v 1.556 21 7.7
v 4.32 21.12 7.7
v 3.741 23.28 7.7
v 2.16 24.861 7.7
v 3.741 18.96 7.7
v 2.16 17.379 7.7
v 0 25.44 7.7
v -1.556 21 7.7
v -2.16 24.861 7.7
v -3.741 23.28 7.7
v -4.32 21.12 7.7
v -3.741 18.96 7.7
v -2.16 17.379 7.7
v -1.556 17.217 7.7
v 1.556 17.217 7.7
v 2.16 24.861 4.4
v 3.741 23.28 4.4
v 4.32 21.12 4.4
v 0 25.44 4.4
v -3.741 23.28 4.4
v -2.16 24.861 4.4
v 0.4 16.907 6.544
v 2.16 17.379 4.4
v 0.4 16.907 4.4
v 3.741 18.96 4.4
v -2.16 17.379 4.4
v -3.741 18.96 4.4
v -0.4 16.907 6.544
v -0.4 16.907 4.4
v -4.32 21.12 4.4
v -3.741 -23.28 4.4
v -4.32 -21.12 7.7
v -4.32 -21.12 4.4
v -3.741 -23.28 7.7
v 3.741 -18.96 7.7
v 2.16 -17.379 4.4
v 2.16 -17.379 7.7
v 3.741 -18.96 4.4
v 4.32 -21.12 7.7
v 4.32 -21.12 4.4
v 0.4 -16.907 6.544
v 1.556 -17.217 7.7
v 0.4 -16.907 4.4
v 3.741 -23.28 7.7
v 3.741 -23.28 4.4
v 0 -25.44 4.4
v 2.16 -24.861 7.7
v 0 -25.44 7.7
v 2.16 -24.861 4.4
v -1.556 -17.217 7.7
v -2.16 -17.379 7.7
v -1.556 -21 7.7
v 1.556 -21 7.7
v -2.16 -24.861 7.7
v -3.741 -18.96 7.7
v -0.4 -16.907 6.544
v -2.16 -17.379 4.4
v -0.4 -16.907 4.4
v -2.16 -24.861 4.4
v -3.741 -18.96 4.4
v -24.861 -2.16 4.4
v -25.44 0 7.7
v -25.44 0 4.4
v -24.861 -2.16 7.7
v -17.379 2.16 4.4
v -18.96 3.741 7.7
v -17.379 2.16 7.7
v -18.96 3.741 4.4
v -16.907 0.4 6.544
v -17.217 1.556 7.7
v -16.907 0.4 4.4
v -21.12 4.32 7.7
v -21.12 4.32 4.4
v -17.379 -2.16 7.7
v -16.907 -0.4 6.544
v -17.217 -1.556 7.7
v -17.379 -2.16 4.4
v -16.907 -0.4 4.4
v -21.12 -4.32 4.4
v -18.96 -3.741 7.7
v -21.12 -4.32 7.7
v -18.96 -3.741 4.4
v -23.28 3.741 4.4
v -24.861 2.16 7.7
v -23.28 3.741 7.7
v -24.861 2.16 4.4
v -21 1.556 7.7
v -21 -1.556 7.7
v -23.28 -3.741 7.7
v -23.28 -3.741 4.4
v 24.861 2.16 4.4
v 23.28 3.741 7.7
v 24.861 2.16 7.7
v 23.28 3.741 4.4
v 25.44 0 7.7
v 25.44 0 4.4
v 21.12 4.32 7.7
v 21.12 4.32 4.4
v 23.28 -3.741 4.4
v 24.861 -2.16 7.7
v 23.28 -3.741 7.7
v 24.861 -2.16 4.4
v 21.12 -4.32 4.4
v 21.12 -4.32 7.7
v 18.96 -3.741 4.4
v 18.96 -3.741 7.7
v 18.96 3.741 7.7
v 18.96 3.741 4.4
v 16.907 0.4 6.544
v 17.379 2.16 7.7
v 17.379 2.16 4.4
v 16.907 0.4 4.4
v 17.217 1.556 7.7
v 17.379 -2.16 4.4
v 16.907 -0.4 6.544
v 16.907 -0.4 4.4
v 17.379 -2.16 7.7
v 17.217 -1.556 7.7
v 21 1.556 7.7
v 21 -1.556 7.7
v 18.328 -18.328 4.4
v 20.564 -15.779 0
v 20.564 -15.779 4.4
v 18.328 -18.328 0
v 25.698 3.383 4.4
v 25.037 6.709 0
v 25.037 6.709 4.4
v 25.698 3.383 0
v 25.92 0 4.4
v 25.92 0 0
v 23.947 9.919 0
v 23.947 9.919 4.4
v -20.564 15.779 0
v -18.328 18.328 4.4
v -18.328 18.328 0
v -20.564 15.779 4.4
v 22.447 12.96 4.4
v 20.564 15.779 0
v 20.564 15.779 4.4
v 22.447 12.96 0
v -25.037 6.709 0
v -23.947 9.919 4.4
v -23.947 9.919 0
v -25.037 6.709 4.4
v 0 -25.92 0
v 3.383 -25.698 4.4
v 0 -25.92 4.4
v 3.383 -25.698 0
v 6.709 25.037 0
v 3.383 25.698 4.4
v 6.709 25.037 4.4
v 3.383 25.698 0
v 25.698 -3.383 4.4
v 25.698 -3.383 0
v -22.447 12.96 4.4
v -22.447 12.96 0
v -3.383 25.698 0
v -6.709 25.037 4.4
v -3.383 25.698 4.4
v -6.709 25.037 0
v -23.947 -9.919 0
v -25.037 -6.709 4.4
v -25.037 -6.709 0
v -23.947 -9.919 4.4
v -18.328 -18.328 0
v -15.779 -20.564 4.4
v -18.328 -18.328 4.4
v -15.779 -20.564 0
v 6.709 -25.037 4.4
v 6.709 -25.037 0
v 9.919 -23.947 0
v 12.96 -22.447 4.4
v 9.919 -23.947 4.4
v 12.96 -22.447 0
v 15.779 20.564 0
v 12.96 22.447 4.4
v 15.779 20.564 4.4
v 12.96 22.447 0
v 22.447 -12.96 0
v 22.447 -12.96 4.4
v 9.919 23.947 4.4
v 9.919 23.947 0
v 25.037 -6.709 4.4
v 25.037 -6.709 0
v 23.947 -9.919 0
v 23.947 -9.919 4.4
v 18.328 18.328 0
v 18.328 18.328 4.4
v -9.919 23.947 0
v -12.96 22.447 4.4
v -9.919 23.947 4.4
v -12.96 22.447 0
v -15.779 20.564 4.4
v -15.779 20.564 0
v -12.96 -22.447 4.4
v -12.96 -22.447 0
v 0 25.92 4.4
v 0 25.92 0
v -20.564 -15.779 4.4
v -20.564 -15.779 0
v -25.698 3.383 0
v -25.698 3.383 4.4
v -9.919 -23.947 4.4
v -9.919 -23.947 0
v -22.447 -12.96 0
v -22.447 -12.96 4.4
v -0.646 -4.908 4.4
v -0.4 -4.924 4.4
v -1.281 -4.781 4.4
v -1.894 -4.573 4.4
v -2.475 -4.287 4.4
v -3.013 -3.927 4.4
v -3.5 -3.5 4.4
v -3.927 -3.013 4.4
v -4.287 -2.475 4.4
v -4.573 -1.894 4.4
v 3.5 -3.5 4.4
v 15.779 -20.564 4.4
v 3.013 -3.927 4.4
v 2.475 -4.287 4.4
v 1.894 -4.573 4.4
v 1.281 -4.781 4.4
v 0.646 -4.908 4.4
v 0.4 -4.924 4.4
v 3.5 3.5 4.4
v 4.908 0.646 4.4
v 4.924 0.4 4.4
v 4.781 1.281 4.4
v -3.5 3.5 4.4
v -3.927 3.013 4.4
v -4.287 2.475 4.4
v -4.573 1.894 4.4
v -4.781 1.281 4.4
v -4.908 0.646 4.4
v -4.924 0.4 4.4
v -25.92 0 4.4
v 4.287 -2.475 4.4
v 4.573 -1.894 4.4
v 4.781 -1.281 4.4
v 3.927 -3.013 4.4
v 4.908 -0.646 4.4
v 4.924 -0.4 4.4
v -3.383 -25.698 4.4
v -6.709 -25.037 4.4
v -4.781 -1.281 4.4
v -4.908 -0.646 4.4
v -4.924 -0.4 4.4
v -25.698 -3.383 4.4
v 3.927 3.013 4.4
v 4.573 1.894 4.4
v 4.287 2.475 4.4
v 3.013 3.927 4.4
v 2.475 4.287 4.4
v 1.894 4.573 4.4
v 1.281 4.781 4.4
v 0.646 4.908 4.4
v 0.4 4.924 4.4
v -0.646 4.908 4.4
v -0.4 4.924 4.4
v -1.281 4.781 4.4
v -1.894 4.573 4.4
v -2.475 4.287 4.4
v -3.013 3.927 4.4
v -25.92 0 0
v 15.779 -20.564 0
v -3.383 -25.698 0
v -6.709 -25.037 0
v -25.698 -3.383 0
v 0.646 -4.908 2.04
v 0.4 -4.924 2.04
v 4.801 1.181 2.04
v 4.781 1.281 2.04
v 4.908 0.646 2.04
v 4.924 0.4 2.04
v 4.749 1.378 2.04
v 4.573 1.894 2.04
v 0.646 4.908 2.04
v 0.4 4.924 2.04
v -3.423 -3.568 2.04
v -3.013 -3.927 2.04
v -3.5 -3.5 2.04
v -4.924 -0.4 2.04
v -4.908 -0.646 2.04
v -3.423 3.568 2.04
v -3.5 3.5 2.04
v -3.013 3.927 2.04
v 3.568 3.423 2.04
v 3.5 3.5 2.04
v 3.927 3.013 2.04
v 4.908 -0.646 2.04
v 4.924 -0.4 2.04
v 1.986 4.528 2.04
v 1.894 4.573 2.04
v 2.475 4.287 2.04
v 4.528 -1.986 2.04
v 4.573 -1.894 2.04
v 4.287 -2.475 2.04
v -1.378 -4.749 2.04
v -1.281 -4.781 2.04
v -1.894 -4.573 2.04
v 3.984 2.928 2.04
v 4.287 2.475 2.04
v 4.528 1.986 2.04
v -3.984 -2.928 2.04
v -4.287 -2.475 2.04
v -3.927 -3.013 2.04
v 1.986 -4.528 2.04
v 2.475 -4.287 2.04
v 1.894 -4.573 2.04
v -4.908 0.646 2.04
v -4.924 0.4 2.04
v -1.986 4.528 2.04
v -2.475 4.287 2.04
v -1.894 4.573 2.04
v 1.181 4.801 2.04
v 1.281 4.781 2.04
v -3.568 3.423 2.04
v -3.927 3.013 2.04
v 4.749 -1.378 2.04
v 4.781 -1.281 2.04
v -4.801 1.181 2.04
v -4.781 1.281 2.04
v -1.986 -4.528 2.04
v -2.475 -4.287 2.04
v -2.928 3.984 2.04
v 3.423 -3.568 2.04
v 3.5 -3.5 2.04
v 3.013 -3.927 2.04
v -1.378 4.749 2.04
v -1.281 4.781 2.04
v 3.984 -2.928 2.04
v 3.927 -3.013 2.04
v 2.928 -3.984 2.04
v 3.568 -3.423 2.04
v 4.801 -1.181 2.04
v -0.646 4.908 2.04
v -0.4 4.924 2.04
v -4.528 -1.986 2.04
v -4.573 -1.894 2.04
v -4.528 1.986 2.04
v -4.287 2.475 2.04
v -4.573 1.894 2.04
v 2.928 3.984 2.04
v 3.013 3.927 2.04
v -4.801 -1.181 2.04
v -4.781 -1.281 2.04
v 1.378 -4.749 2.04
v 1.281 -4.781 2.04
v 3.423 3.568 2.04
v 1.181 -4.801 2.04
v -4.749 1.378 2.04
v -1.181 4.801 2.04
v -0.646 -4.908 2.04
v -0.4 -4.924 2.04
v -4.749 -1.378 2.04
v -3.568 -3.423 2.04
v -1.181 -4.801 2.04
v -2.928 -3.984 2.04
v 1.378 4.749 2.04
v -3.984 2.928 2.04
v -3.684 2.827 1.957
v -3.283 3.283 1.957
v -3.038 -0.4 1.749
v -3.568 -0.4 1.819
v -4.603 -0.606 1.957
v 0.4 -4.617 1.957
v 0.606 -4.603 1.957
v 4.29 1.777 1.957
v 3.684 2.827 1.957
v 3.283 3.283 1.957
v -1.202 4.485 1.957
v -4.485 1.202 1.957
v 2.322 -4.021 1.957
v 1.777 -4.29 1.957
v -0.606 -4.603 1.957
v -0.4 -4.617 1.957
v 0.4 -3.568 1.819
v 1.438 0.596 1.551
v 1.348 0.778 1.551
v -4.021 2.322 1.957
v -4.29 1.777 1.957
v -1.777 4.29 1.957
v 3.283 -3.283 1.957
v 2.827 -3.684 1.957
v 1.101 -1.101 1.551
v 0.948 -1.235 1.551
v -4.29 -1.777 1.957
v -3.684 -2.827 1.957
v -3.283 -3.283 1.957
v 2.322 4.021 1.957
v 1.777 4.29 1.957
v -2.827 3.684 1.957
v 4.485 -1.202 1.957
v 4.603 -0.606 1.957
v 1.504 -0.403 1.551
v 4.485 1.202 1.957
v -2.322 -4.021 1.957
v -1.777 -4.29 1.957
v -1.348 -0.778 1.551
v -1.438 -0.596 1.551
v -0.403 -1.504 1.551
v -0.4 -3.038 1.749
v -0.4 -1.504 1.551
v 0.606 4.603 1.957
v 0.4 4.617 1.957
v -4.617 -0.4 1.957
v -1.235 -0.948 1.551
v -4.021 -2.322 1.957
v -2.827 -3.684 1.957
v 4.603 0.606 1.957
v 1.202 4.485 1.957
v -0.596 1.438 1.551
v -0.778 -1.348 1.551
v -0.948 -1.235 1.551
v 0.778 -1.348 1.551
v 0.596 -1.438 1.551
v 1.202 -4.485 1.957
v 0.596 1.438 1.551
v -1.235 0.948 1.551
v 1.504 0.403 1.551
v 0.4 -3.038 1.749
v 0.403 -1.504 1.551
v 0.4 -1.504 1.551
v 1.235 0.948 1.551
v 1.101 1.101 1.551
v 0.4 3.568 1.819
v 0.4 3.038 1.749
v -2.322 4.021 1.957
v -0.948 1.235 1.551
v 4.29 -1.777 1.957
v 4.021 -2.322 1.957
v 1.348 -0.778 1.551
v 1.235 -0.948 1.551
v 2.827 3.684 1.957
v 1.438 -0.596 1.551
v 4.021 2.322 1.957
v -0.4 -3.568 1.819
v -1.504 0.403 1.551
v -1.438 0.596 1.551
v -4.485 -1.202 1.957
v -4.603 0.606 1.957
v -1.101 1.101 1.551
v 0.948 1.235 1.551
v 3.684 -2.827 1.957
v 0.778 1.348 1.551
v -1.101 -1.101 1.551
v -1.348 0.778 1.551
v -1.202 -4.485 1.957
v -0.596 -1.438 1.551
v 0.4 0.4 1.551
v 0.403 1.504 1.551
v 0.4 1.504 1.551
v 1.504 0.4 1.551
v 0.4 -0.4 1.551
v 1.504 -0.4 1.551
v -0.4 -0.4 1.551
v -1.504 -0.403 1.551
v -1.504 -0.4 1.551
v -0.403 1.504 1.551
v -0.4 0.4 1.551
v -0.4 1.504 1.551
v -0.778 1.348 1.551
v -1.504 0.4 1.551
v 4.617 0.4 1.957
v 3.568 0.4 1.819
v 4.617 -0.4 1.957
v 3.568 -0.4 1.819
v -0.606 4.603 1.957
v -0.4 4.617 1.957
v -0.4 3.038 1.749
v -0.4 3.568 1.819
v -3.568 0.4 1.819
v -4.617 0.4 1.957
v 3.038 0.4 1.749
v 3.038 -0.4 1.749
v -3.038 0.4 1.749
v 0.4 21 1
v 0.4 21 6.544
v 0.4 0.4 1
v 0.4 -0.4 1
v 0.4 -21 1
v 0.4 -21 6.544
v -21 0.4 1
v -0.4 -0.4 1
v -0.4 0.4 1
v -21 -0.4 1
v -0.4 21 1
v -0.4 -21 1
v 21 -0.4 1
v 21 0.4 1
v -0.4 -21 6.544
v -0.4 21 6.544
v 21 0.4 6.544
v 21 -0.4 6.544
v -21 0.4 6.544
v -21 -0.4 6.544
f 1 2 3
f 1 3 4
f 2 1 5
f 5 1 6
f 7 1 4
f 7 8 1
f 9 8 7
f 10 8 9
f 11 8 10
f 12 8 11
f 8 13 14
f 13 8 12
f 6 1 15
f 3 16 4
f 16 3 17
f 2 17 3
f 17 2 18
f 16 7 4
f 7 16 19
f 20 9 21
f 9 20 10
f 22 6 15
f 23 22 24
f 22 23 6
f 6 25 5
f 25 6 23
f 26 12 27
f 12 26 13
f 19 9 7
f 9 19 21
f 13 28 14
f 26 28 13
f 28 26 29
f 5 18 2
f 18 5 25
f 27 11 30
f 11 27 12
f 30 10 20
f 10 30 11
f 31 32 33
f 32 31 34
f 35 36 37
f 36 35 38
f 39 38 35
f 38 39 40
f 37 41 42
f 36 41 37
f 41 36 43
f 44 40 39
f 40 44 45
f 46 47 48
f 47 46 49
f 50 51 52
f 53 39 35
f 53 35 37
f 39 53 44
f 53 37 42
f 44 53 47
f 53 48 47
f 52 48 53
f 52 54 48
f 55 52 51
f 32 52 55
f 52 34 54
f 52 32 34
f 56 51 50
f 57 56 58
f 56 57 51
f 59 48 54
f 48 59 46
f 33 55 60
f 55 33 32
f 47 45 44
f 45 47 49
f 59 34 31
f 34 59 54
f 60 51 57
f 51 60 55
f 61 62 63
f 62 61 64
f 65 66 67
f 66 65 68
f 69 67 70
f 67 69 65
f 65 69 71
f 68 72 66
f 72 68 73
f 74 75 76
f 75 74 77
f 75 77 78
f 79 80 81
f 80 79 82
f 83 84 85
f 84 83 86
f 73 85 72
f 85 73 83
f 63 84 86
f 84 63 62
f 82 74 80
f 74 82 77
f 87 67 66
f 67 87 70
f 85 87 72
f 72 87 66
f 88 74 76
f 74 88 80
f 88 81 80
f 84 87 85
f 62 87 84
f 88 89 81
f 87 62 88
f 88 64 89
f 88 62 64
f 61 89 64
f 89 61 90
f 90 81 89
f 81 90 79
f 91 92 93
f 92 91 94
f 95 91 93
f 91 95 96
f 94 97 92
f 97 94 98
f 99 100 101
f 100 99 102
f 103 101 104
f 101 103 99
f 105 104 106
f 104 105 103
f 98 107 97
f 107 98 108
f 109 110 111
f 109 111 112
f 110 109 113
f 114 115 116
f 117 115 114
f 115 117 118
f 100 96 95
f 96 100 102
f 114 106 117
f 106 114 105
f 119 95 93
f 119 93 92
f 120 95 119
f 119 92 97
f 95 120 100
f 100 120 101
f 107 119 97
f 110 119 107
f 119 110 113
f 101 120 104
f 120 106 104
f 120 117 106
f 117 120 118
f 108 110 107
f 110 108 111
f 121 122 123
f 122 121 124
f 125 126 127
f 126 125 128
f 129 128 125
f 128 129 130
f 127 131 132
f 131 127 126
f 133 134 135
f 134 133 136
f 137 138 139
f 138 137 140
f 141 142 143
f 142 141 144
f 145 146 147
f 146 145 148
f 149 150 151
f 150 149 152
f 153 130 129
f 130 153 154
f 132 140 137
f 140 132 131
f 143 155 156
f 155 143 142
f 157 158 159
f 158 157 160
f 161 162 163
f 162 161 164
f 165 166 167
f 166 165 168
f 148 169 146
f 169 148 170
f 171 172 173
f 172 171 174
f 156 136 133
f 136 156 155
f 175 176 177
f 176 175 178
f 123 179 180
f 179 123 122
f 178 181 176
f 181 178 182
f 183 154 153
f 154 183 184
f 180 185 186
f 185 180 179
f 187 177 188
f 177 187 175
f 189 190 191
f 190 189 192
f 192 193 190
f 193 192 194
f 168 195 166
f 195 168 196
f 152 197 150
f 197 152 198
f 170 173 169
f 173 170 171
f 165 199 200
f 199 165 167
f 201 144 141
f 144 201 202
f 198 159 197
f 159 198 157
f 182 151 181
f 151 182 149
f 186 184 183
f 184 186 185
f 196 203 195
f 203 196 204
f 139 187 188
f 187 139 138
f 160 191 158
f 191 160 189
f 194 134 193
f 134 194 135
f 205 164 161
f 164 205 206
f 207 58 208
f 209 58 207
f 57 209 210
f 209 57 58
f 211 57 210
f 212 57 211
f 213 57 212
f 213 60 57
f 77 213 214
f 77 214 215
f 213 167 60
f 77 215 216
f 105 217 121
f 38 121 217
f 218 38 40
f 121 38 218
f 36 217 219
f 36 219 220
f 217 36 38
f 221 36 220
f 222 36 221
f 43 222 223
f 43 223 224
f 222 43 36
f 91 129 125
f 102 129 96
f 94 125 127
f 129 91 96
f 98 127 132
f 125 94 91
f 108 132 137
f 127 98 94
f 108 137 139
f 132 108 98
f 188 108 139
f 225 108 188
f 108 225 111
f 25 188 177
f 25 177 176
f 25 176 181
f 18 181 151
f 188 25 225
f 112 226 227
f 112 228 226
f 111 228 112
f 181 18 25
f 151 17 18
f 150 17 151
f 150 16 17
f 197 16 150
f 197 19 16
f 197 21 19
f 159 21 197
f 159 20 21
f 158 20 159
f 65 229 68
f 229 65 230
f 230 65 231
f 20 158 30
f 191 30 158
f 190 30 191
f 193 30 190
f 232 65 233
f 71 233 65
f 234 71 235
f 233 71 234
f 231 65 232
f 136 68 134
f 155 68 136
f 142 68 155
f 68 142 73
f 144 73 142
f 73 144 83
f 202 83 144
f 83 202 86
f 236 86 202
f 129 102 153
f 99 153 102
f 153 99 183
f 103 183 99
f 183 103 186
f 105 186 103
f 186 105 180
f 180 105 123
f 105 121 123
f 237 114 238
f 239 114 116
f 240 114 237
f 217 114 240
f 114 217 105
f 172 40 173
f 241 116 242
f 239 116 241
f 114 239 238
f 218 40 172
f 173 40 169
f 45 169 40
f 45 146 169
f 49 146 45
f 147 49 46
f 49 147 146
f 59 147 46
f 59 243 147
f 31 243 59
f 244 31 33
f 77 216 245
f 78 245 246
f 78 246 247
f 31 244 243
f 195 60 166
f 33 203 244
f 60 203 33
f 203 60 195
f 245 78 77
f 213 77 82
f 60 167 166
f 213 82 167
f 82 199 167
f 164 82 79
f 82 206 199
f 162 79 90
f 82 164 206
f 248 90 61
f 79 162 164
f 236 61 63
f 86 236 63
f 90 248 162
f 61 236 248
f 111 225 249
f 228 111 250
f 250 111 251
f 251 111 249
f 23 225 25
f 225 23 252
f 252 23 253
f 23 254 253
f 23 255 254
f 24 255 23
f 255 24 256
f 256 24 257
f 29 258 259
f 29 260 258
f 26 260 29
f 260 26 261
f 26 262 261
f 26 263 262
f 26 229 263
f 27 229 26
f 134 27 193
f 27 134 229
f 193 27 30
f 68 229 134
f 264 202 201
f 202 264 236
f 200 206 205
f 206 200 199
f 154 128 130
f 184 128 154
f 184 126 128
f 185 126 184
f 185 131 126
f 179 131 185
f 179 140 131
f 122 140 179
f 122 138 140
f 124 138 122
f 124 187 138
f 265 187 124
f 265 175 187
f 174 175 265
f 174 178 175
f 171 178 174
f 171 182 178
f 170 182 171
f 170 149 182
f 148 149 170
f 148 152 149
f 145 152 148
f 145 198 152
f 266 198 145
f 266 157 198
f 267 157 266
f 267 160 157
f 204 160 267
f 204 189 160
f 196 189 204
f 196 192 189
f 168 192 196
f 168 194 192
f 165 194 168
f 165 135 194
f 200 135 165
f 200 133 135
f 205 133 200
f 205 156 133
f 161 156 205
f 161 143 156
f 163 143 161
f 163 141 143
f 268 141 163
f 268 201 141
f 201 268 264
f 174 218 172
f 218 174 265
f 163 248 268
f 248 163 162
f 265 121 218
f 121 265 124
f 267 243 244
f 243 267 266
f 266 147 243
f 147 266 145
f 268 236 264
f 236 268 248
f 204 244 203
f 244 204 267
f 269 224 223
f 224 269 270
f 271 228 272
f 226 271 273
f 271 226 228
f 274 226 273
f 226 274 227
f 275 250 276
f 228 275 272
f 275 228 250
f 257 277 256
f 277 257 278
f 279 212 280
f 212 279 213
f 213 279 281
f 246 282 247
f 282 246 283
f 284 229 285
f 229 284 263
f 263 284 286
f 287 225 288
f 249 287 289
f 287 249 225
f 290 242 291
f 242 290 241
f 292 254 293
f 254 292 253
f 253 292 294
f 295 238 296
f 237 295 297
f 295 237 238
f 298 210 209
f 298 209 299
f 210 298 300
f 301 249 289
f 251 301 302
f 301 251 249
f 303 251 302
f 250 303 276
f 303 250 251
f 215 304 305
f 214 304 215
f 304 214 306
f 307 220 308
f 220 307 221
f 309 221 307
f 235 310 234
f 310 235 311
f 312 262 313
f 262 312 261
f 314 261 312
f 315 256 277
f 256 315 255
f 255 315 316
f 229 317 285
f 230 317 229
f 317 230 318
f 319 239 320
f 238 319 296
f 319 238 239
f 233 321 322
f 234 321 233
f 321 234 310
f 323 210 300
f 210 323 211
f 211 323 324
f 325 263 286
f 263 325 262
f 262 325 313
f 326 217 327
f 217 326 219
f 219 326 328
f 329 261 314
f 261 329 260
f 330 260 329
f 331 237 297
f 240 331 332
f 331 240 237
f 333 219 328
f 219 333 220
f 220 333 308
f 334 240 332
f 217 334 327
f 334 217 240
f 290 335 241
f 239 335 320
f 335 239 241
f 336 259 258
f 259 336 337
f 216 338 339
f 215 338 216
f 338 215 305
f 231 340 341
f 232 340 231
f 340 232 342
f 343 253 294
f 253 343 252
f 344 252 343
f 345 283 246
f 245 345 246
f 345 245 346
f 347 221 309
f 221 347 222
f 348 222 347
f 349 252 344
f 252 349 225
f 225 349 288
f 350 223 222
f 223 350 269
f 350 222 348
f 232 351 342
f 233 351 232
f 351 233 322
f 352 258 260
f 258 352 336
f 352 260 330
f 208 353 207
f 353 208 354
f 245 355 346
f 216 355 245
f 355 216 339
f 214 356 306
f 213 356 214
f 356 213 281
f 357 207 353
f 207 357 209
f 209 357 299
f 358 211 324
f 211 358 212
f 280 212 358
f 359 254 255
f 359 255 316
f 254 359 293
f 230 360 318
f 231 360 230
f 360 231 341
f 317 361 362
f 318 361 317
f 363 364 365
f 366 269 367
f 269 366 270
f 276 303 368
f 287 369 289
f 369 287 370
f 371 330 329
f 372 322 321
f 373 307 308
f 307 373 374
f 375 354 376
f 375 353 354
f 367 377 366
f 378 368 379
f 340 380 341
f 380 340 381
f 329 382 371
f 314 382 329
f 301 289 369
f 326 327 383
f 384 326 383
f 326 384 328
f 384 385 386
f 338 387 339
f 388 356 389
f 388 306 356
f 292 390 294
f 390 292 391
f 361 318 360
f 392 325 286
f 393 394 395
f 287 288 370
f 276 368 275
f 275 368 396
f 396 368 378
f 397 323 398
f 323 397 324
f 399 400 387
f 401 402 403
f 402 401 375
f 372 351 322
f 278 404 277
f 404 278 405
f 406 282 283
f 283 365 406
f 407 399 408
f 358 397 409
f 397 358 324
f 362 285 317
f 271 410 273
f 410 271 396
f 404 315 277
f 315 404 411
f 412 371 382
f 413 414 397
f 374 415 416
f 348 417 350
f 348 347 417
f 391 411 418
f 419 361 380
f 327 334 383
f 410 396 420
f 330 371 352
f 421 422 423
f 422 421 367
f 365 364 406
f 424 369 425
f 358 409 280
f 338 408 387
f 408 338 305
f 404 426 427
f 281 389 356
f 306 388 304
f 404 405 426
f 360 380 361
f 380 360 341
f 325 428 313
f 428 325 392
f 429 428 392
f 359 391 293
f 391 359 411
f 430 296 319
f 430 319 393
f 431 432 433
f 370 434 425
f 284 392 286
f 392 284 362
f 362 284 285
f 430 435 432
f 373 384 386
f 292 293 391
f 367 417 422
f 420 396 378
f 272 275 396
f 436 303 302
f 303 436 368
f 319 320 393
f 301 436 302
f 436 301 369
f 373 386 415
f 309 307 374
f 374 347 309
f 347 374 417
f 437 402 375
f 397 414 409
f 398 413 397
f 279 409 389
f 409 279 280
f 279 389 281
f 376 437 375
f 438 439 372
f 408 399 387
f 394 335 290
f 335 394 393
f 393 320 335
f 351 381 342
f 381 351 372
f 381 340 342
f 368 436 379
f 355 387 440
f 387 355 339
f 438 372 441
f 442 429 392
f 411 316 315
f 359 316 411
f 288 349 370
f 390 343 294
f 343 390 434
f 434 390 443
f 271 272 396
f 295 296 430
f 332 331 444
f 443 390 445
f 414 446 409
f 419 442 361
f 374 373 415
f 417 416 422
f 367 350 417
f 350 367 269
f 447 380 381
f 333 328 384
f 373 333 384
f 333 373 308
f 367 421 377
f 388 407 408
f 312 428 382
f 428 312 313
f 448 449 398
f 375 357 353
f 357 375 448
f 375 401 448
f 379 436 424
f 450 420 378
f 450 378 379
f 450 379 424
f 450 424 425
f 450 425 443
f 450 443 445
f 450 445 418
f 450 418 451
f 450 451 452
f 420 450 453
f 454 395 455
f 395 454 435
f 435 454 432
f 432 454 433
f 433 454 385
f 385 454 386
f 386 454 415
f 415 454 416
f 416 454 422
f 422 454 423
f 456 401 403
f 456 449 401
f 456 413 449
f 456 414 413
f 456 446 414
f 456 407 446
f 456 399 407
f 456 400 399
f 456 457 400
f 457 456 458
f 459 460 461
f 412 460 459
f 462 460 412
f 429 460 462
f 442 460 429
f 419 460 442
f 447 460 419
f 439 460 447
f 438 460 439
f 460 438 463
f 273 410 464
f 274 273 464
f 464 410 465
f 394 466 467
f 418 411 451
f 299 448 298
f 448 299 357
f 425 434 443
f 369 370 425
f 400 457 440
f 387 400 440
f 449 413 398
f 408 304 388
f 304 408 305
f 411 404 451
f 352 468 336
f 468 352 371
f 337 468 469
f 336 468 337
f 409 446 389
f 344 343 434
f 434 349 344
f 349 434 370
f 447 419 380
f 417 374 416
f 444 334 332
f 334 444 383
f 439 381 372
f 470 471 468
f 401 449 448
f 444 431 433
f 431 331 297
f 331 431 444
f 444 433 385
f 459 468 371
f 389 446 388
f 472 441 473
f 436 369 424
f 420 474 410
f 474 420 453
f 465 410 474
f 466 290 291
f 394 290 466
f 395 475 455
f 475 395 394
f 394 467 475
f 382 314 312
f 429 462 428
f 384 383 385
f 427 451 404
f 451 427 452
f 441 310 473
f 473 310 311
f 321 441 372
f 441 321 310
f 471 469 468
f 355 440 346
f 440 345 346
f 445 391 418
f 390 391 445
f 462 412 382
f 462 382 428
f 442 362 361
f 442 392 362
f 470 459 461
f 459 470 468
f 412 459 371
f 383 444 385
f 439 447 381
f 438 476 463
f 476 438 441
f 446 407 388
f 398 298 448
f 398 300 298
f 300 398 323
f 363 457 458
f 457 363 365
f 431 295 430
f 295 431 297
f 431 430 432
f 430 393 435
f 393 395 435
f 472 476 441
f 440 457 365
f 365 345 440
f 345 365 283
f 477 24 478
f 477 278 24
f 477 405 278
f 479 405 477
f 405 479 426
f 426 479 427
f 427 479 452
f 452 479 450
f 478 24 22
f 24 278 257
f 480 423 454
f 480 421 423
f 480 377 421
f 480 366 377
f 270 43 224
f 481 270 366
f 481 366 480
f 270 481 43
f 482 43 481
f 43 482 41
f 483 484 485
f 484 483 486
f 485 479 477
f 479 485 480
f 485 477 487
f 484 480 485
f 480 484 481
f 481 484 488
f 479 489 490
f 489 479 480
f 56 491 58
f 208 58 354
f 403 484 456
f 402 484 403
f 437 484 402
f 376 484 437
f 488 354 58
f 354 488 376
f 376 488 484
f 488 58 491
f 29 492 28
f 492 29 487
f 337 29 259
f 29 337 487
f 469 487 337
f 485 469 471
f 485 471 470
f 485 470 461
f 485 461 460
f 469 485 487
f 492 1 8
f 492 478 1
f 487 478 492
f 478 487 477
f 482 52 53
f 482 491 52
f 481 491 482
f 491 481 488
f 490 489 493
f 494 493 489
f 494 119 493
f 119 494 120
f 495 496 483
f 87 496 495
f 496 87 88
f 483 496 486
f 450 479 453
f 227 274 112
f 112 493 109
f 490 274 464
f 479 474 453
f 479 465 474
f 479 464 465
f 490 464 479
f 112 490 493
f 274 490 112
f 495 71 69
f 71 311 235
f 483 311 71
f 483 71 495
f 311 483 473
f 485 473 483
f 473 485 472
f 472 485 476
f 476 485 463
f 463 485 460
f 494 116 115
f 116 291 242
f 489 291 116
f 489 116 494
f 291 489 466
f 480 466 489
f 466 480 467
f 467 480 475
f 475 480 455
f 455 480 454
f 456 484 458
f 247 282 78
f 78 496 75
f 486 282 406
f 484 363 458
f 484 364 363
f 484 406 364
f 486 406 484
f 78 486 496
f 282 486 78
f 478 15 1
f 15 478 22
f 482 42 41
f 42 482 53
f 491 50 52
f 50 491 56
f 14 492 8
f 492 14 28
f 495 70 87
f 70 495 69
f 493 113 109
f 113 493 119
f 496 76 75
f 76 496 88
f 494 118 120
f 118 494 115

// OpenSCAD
//Pill diameter
pd=9.6;//

//Pill hight1 
pt=4.2;//

//Pill hight2
pt2=2.6;

//Brade gap
bg=0.8;//

//Gap taper offset
gto=2.2; //

//Parts sellect
part="base";//[pill,base]  

pc=(pt-pt2)/2;//Convex value
sp=pd/(tan(2*atan(2*pc/pd))*2)+pd;// convex diameter

//Base hight
bh=pt2+(pt-pt2)/2+1;

echo(sp);// convex diameter
echo(pd+0.4);

module pill()
{
rotate([0,0,0])intersection(){
cylinder(h=20,r=pd/2+0.15,center=true,$fn=48);
translate([0,0,-sp+(pt2/2+0.2)])sphere(r=sp+0.2,center=true,$fn=48);
translate([0,0,sp-(pt2/2+0.2)])sphere(r=sp+0.2,center=true,$fn=48);
								}
}

module post2()
{
translate([0,pd*2.2,bh])cylinder(h=bh*1.5,r=pd*0.45 ,center=true,$fn=12);
translate([0,-pd*2.2,bh])cylinder(h=bh*1.5,r=pd*0.45 ,center=true,$fn=12);
translate([-pd*2.2,0,bh])cylinder(h=bh*1.5,r=pd*0.45 ,center=true,$fn=12);
translate([pd*2.2,0,bh])cylinder(h=bh*1.5,r=pd*0.45 ,center=true,$fn=12);
}

module post3()
{
translate([0,18,bh])cylinder(h=bh*2,r=pd*0.45 ,center=true,$fn=12);
translate([0,-18,bh])cylinder(h=bh*2,r=pd*0.45 ,center=true,$fn=12);
translate([-18,0,bh])cylinder(h=bh*2,r=pd*0.45 ,center=true,$fn=12);
translate([18,0,bh])cylinder(h=bh*2,r=pd*0.45 ,center=true,$fn=12);
}

if(part=="pill") {
		translate([0,0,0])pill();
				 }
else if (part=="base"){
	
	difference(){
			union(){ 
					translate([0,0,bh/2])cylinder(h=bh,r=pd*2.7 ,center=true,$fn=48);

					translate([0,0,0])post2();
					}
	translate([0,0,bh/2+1])pill();
	translate([0,0,bh])pill();
	translate([-bg/2,-21,1])cube(size=[bg,42,20], center=false);
	translate([-21,-bg/2,1])cube(size=[42,bg,20], center=false);
	translate([0,0,bh*gto])rotate([0,45,0])cube(size=[5,42,5], center=true);
	translate([0,0,bh*gto])rotate([45,0,0])cube(size=[42,5,5], center=true);
				}
						}
